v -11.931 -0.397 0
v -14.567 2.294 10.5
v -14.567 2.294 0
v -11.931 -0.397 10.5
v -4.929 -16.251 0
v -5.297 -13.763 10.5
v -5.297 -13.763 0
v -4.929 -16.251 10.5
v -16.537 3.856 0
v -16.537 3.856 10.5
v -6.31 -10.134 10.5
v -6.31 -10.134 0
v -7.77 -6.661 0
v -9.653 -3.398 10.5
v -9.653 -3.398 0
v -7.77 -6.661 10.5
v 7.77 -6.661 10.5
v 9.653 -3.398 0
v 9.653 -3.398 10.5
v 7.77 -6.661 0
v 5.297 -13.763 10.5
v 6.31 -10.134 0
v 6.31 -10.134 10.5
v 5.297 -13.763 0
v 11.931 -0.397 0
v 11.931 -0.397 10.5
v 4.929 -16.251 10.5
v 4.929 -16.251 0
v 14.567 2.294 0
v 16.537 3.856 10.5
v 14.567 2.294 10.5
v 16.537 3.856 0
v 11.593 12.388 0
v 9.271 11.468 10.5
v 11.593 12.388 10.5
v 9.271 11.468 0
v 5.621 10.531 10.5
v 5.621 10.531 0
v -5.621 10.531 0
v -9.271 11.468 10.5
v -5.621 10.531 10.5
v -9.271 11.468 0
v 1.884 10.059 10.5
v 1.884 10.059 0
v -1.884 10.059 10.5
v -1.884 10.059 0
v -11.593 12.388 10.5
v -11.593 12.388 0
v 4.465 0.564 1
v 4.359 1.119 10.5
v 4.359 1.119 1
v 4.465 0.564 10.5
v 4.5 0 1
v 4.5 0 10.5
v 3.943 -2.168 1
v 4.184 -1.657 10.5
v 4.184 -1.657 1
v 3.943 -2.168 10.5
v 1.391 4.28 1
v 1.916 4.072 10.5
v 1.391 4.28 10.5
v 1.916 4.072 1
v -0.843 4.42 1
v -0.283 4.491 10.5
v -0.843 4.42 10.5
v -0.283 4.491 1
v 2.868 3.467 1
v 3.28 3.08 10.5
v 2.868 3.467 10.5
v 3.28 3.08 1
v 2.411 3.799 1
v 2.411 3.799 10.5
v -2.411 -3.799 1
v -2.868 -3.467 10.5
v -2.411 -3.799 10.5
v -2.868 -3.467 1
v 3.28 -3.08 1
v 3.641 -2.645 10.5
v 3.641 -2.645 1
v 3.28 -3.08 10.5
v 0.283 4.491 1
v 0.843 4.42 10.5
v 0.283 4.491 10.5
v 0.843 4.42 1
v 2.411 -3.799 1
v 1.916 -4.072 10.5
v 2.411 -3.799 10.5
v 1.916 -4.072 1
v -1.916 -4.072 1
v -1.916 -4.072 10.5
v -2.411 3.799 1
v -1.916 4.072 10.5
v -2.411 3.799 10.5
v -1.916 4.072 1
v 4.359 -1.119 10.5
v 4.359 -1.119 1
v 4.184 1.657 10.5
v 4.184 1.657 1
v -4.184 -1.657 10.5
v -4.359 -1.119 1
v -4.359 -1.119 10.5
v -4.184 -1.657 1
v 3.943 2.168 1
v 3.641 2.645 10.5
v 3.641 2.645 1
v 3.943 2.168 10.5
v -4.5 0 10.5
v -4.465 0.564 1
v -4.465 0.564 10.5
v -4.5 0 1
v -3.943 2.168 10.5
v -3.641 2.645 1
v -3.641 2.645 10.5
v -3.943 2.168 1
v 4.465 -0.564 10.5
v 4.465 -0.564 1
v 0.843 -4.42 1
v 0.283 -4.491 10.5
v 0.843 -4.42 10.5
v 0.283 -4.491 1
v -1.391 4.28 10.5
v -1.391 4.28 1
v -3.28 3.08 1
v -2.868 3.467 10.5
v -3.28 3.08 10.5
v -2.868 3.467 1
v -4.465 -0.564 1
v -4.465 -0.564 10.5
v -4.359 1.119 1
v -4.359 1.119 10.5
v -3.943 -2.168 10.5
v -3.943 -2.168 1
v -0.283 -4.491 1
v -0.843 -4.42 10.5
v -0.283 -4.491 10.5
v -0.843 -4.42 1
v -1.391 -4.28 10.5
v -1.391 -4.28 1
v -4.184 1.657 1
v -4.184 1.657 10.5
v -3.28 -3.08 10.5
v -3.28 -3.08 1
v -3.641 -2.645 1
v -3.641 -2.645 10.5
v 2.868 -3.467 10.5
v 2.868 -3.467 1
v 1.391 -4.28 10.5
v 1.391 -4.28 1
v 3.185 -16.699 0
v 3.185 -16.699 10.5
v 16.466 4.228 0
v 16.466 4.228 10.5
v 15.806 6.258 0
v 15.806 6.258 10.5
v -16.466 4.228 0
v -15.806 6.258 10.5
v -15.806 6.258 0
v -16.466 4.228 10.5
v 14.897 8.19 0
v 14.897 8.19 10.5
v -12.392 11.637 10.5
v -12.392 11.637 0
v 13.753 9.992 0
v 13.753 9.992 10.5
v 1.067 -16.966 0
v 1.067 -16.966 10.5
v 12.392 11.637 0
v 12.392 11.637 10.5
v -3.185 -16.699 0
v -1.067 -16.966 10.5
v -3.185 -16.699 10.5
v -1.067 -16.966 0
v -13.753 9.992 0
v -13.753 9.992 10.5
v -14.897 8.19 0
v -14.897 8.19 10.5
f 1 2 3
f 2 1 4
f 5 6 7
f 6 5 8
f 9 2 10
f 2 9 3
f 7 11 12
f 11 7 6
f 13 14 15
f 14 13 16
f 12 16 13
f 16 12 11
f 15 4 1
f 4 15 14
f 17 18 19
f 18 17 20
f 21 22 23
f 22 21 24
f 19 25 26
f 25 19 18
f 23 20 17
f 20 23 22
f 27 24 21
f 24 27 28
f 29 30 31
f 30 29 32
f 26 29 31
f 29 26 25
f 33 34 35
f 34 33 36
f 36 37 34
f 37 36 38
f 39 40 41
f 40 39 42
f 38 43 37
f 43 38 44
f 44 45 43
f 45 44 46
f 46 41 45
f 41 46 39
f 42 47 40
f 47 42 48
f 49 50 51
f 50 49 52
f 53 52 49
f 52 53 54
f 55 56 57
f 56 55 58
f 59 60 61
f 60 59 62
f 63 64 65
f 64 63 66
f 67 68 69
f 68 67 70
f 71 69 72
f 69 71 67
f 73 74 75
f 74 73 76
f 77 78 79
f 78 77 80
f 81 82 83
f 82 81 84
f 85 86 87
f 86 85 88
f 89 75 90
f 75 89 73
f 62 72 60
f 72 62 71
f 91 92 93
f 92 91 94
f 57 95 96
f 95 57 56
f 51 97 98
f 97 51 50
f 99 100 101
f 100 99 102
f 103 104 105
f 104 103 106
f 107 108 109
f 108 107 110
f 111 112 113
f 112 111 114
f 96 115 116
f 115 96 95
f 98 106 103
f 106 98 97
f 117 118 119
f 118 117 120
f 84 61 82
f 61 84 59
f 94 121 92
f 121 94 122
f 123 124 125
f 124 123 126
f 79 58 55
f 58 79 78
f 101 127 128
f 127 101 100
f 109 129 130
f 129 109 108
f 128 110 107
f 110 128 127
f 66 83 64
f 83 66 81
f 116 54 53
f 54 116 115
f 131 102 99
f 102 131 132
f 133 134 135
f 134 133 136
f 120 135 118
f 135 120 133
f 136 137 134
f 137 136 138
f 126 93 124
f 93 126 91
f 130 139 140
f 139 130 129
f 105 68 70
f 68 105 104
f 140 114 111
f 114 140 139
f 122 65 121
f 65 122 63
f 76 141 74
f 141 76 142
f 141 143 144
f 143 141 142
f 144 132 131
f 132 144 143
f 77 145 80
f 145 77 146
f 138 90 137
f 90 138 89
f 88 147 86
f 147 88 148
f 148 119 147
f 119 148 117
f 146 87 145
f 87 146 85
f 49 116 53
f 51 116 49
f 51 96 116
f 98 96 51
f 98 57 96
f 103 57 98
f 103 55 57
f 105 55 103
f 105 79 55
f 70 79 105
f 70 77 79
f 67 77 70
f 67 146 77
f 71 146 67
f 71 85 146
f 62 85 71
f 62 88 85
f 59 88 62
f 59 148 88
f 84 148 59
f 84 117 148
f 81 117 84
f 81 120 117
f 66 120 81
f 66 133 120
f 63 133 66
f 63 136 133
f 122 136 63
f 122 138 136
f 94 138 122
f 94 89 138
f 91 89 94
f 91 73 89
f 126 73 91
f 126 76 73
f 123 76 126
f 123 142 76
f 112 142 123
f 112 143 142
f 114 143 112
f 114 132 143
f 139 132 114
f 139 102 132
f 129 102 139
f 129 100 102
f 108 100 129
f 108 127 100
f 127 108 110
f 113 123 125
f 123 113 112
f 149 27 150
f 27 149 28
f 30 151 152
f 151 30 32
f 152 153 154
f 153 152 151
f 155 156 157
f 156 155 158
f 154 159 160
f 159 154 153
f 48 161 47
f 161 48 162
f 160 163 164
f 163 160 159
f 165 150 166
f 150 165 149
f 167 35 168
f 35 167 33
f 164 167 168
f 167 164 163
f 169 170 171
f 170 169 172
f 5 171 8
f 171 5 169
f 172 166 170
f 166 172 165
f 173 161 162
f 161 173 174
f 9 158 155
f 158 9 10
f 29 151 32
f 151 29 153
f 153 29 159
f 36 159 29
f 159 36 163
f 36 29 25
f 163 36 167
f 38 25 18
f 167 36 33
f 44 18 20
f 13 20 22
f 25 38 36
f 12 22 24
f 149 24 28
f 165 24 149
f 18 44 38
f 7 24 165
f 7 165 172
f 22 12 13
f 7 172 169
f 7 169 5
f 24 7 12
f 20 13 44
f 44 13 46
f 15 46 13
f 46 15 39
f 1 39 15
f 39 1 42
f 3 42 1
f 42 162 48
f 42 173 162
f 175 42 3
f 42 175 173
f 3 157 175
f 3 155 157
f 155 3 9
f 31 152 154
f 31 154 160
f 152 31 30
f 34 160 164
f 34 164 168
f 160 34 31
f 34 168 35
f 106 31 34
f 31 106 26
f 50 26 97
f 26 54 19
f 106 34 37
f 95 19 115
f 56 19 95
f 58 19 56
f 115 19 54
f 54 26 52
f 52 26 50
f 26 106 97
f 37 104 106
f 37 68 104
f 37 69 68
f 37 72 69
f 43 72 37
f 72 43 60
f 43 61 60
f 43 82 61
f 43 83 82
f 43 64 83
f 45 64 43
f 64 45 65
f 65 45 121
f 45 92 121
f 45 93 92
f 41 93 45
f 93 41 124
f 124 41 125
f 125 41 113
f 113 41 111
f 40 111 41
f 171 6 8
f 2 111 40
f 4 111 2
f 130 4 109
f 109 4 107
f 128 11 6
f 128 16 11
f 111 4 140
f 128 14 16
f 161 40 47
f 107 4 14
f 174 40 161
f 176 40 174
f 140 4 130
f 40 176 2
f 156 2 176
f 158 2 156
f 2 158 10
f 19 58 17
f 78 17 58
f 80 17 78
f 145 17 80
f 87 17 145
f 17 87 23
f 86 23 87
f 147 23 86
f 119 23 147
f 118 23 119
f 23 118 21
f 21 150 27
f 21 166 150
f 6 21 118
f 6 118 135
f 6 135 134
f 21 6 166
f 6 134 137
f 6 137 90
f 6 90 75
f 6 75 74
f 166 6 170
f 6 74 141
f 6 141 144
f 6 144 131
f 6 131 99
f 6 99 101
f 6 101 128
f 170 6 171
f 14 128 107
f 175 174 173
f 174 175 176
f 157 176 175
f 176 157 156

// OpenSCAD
$fn=50;

difference(){
cylinder(h=10.5, r=17);
	union(){
		rotate([0,0,120]) translate([0,40,-1]) cylinder(r=30,h=17);
		rotate([0,0,240]) translate([0,40,-1]) cylinder(r=30,h=17);
		rotate([0,0,0  ]) translate([0,40,-1]) cylinder(r=30,h=17);
		rotate([0,0,0  ]) translate([0,00,1]) cylinder(r=9/2,h=17);
	}
}
